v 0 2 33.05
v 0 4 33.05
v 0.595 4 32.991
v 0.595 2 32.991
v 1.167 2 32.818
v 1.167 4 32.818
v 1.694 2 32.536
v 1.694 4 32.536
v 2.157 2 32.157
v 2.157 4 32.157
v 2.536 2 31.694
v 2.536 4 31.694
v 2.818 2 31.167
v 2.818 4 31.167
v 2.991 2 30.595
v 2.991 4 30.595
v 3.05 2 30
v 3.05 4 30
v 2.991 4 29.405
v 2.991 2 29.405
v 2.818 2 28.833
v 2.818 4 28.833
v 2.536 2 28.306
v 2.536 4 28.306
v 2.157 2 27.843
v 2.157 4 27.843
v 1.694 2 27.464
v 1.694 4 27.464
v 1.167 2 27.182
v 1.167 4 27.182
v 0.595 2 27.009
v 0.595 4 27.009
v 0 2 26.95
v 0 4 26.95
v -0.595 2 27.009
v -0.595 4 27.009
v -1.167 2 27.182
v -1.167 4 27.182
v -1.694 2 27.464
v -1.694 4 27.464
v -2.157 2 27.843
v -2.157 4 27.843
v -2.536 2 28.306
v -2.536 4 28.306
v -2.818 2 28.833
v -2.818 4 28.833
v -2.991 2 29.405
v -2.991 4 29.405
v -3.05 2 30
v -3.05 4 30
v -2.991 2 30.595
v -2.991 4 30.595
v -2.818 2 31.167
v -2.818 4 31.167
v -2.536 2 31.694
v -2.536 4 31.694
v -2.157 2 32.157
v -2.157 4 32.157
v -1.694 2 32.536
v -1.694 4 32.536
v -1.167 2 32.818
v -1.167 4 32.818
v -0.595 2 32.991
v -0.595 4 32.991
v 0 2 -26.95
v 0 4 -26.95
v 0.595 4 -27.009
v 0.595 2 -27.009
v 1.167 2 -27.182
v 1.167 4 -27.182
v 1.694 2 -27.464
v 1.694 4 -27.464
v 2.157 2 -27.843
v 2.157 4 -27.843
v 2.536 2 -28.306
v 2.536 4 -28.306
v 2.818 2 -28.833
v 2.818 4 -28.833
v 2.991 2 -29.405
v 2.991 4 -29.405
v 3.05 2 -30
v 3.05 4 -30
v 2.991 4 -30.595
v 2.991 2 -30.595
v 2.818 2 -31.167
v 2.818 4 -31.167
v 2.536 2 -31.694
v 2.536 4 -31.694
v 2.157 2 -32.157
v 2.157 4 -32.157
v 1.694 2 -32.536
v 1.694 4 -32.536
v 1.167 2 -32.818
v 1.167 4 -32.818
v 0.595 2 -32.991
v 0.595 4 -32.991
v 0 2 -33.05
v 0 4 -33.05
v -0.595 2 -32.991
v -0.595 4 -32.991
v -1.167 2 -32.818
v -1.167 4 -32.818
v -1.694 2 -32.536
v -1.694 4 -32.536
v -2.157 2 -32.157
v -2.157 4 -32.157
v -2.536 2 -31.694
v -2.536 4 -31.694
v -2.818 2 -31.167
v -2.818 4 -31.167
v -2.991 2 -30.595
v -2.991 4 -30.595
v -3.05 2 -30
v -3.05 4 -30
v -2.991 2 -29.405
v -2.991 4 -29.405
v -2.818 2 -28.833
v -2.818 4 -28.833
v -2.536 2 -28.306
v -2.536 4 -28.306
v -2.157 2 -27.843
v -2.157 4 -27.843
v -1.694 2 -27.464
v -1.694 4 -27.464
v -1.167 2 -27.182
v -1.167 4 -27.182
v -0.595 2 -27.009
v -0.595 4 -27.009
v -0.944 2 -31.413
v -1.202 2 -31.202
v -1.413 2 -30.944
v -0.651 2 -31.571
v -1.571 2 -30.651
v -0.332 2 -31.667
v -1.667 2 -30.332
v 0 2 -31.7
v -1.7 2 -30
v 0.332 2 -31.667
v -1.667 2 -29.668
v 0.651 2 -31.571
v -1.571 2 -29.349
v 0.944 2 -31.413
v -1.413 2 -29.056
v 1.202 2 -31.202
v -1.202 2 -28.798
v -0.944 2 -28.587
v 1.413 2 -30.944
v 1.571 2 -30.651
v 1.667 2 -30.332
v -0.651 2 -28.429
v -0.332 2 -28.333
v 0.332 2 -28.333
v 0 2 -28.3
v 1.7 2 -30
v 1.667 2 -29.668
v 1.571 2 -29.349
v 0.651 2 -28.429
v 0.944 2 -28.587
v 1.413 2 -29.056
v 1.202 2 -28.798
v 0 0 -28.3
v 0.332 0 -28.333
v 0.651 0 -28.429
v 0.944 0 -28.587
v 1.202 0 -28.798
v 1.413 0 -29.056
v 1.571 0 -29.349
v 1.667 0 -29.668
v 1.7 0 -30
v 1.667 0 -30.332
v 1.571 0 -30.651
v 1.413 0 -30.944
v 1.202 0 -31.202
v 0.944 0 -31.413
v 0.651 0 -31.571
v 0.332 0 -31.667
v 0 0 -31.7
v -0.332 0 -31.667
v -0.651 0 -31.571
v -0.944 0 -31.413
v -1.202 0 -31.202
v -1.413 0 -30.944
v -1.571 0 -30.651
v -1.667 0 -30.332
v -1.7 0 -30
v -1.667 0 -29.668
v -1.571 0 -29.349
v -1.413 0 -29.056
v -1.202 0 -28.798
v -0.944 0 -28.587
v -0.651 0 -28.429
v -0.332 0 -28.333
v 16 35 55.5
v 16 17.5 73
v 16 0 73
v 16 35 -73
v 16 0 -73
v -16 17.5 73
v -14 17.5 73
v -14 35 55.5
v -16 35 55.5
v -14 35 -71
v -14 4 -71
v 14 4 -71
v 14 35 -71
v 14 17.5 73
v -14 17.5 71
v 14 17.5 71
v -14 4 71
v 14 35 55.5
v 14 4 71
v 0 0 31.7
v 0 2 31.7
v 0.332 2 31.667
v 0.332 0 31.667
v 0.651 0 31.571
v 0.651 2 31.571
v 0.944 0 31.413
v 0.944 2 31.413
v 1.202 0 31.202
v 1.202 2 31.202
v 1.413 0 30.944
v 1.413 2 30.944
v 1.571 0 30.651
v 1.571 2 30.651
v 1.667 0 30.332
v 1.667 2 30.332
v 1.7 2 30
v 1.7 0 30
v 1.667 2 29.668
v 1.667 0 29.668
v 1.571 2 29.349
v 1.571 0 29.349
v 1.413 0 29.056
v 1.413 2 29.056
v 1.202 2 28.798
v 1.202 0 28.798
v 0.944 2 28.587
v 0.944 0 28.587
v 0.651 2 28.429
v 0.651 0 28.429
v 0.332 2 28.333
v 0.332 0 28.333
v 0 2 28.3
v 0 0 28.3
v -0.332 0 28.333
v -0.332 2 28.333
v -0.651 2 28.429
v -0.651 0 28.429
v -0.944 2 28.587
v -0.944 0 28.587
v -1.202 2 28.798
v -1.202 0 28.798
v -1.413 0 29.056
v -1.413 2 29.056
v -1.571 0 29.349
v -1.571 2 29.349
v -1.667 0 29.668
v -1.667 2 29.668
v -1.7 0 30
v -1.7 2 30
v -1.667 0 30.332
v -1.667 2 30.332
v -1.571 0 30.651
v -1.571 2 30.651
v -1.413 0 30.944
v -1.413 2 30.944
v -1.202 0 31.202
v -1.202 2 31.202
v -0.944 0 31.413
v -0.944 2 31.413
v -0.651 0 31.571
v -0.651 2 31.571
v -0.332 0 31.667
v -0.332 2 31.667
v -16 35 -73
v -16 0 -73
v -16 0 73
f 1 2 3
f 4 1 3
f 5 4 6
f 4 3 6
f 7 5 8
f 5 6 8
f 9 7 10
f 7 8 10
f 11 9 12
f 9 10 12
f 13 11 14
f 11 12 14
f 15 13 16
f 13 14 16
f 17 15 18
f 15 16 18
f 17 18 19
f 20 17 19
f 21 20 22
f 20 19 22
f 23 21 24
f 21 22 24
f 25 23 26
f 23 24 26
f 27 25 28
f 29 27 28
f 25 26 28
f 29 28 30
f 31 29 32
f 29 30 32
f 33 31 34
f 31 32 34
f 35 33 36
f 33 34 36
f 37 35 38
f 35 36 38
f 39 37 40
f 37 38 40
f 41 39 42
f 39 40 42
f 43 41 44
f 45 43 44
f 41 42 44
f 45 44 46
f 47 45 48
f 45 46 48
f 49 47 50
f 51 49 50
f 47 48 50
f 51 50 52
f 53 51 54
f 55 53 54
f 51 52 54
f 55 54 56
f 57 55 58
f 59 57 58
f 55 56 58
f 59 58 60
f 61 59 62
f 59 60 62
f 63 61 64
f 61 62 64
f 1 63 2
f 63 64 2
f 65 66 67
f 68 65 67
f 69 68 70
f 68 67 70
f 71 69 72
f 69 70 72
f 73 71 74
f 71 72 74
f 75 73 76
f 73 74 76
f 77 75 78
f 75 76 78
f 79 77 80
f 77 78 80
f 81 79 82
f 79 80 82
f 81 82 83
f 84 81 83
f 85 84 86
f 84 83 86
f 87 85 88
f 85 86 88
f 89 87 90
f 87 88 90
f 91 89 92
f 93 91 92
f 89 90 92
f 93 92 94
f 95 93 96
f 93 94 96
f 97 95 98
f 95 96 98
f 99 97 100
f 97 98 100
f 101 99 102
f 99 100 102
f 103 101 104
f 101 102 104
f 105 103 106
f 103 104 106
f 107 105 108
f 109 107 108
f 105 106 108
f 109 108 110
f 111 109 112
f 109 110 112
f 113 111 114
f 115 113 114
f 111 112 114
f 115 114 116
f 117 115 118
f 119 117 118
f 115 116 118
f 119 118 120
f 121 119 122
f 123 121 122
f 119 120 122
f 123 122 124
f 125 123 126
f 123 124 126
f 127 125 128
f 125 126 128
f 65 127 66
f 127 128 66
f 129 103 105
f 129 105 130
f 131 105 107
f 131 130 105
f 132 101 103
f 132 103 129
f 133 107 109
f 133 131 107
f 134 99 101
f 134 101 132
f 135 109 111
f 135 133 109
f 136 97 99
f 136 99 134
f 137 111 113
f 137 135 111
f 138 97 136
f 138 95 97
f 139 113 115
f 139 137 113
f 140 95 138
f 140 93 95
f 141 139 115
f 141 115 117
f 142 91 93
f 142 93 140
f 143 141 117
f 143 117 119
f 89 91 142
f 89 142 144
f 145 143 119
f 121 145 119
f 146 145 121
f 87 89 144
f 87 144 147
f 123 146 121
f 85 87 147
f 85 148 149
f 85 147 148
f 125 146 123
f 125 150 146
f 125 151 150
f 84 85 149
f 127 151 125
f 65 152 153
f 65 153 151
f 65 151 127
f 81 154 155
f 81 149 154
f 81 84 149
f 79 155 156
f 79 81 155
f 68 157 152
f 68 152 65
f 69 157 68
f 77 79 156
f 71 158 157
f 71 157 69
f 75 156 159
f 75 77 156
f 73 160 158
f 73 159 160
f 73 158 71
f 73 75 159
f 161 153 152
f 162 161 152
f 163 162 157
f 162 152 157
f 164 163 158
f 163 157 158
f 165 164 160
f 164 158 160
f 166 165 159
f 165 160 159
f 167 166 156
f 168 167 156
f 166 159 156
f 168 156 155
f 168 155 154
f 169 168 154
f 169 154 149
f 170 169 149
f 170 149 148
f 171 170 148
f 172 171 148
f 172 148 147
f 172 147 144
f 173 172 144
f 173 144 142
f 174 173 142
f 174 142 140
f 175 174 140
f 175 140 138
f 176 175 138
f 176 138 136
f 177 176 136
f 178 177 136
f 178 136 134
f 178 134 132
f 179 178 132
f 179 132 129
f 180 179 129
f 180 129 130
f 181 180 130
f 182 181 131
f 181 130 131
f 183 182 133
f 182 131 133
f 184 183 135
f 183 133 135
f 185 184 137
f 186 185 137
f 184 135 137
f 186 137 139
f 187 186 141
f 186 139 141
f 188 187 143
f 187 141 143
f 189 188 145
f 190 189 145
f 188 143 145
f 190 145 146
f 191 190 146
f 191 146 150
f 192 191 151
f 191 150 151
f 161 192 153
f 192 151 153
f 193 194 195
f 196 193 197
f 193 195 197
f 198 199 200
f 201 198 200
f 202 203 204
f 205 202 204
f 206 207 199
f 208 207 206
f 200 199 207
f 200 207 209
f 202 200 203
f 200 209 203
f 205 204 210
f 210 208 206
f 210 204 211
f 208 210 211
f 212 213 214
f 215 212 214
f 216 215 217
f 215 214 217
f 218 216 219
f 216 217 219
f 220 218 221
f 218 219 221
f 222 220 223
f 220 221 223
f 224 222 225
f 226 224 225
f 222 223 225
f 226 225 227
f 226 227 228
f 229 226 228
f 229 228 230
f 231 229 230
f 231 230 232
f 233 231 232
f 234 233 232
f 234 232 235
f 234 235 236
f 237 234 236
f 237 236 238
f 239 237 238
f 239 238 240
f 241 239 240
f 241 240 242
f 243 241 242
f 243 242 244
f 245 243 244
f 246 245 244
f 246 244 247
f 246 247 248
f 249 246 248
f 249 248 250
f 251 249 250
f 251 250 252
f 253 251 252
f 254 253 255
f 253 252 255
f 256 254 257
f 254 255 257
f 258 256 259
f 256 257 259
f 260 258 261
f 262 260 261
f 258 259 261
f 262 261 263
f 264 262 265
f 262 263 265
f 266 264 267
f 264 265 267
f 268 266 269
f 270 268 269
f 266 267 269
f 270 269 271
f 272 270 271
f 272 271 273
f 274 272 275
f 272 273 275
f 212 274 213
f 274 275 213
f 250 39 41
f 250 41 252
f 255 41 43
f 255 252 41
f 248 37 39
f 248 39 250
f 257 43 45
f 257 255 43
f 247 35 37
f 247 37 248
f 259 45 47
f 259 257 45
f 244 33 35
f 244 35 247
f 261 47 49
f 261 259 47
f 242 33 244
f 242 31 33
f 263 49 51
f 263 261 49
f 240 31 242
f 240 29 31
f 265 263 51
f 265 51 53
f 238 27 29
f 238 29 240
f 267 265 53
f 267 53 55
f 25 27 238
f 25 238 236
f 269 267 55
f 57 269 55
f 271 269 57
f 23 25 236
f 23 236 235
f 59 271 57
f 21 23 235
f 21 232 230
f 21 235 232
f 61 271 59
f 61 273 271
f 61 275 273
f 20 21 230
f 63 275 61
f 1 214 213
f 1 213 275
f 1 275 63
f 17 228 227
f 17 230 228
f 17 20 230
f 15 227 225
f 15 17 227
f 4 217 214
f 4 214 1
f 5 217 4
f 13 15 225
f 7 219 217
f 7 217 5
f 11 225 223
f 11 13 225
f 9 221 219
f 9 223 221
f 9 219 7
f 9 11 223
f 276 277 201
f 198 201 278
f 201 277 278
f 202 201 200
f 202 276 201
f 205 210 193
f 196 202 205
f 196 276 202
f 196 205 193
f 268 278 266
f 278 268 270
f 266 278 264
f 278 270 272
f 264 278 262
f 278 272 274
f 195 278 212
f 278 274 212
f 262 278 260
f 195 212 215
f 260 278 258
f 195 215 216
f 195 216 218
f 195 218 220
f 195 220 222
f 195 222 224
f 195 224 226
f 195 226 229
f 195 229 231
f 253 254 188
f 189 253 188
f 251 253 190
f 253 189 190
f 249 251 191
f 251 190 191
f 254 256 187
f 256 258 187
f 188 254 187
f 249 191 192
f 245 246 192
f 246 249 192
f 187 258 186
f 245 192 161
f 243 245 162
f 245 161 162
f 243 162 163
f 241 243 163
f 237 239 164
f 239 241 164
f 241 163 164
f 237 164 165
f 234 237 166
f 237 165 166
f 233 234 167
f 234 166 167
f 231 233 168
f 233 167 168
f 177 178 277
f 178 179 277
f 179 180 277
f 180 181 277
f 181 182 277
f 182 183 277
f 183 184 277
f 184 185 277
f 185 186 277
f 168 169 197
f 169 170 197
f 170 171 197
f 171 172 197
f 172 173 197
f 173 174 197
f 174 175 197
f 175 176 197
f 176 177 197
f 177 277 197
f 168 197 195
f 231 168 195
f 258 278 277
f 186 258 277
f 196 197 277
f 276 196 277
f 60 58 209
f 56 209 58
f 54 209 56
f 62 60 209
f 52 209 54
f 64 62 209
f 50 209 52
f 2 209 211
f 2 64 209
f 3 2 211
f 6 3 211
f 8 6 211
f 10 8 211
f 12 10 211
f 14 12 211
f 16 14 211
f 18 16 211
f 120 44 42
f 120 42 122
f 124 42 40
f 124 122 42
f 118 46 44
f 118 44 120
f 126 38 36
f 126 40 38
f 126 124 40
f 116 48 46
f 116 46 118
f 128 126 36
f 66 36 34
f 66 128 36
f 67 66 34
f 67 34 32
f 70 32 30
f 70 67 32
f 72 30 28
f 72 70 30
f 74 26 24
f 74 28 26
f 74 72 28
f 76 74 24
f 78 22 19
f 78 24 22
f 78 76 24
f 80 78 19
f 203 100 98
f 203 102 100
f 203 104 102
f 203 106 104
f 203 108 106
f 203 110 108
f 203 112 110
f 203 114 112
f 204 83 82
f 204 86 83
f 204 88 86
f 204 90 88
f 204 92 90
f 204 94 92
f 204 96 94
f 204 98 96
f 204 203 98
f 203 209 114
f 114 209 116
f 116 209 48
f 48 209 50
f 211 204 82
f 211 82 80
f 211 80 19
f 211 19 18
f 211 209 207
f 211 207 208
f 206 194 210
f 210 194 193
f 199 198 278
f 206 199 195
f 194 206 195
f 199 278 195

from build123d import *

# Parameters (mm, degrees)
SKETCH1_W           = 28
SKETCH1_H           = 142
BOSS_EXTRUDE1_DEPTH = 4
BOSS_EXTRUDE2_DEPTH = 35
SKETCH1_5_W         = 28
SKETCH1_5_H         = 2
BOSS_EXTRUDE3_DEPTH = 17.5
CUT_EXTRUDE1_REACH  = 82.907
SKETCH2_R           = 1.7
SKETCH2_3_R         = 3.05
SKETCH2_3_R_2       = 1.7
CUT_EXTRUDE2_DEPTH  = 2
CUT_EXTRUDE3_DEPTH  = 88.051708771


with BuildPart() as part:
    # Sketch1 → Boss-Extrude1 (new body)
    with BuildSketch(Plane(origin=(0, 0, 0), x_dir=(1, 0, 0), z_dir=(0, 1, 0))):
        Rectangle(SKETCH1_W, SKETCH1_H)
    extrude(amount=BOSS_EXTRUDE1_DEPTH)

    # Sketch1<4> → Boss-Extrude2 (add)
    with BuildSketch(Plane(origin=(0, 0, 0), x_dir=(1, 0, 0), z_dir=(0, 1, 0))):
        Polygon((-14, -73), (-14, -71), (-14, 71), (14, 71), (14, -71), (14, -73), (16, -73), (16, 73), (-16, 73), (-16, -73), align=None)
    extrude(amount=BOSS_EXTRUDE2_DEPTH)

    # Sketch1<5> → Boss-Extrude3 (add)
    with BuildSketch(Plane(origin=(0, 0, 0), x_dir=(1, 0, 0), z_dir=(0, 1, 0))):
        with Locations((0, -72)):
            Rectangle(SKETCH1_5_W, SKETCH1_5_H)
    extrude(amount=BOSS_EXTRUDE3_DEPTH)

    # Sketch2 → Cut-Extrude1 (cut, up to next)
    with BuildSketch(Plane(origin=(0, 4, 0), x_dir=(1, 0, 0), z_dir=(0, 1, 0)), mode=Mode.PRIVATE) as cut_extrude1_sk1:
        with Locations((0, 30)):
            Circle(SKETCH2_R)
    cut_extrude1_tool1 = extrude(cut_extrude1_sk1.sketch, amount=-CUT_EXTRUDE1_REACH, mode=Mode.PRIVATE) & part.part
    # Sketch2 → Cut-Extrude1 (cut, up to next)
    with BuildSketch(Plane(origin=(0, 4, 0), x_dir=(1, 0, 0), z_dir=(0, 1, 0)), mode=Mode.PRIVATE) as cut_extrude1_sk2:
        with Locations((0, -30)):
            Circle(SKETCH2_R)
    cut_extrude1_tool2 = extrude(cut_extrude1_sk2.sketch, amount=-CUT_EXTRUDE1_REACH, mode=Mode.PRIVATE) & part.part
    add(cut_extrude1_tool1.solids().sort_by_distance((0, 4, -30))[0], mode=Mode.SUBTRACT)
    add(cut_extrude1_tool2.solids().sort_by_distance((0, 4, 30))[0], mode=Mode.SUBTRACT)

    # Sketch2<3> → Cut-Extrude2 (cut)
    # profile 1 of 2: a face of its own
    with BuildSketch(Plane(origin=(0, 4, 0), x_dir=(1, 0, 0), z_dir=(0, 1, 0))):
        with Locations((0, 30)):
            Circle(SKETCH2_3_R)
        with Locations((0, 30)):
            Circle(SKETCH2_3_R_2, mode=Mode.SUBTRACT)
    # profile 2 of 2: a face of its own
    with BuildSketch(Plane(origin=(0, 4, 0), x_dir=(1, 0, 0), z_dir=(0, 1, 0))):
        with Locations((0, -30)):
            Circle(SKETCH2_3_R)
        with Locations((0, -30)):
            Circle(SKETCH2_3_R_2, mode=Mode.SUBTRACT)
    extrude(amount=-CUT_EXTRUDE2_DEPTH, mode=Mode.SUBTRACT)

    # Sketch3 → Cut-Extrude3 (cut, through all)
    with BuildSketch(Plane(origin=(16, 0, 0), x_dir=(0, 0, -1), z_dir=(1, 0, 0))):
        Polygon((-73, 17.5), (-55.5, 35), (-73, 35), align=None)
    extrude(amount=-CUT_EXTRUDE3_DEPTH, mode=Mode.SUBTRACT)


solid = part.part
